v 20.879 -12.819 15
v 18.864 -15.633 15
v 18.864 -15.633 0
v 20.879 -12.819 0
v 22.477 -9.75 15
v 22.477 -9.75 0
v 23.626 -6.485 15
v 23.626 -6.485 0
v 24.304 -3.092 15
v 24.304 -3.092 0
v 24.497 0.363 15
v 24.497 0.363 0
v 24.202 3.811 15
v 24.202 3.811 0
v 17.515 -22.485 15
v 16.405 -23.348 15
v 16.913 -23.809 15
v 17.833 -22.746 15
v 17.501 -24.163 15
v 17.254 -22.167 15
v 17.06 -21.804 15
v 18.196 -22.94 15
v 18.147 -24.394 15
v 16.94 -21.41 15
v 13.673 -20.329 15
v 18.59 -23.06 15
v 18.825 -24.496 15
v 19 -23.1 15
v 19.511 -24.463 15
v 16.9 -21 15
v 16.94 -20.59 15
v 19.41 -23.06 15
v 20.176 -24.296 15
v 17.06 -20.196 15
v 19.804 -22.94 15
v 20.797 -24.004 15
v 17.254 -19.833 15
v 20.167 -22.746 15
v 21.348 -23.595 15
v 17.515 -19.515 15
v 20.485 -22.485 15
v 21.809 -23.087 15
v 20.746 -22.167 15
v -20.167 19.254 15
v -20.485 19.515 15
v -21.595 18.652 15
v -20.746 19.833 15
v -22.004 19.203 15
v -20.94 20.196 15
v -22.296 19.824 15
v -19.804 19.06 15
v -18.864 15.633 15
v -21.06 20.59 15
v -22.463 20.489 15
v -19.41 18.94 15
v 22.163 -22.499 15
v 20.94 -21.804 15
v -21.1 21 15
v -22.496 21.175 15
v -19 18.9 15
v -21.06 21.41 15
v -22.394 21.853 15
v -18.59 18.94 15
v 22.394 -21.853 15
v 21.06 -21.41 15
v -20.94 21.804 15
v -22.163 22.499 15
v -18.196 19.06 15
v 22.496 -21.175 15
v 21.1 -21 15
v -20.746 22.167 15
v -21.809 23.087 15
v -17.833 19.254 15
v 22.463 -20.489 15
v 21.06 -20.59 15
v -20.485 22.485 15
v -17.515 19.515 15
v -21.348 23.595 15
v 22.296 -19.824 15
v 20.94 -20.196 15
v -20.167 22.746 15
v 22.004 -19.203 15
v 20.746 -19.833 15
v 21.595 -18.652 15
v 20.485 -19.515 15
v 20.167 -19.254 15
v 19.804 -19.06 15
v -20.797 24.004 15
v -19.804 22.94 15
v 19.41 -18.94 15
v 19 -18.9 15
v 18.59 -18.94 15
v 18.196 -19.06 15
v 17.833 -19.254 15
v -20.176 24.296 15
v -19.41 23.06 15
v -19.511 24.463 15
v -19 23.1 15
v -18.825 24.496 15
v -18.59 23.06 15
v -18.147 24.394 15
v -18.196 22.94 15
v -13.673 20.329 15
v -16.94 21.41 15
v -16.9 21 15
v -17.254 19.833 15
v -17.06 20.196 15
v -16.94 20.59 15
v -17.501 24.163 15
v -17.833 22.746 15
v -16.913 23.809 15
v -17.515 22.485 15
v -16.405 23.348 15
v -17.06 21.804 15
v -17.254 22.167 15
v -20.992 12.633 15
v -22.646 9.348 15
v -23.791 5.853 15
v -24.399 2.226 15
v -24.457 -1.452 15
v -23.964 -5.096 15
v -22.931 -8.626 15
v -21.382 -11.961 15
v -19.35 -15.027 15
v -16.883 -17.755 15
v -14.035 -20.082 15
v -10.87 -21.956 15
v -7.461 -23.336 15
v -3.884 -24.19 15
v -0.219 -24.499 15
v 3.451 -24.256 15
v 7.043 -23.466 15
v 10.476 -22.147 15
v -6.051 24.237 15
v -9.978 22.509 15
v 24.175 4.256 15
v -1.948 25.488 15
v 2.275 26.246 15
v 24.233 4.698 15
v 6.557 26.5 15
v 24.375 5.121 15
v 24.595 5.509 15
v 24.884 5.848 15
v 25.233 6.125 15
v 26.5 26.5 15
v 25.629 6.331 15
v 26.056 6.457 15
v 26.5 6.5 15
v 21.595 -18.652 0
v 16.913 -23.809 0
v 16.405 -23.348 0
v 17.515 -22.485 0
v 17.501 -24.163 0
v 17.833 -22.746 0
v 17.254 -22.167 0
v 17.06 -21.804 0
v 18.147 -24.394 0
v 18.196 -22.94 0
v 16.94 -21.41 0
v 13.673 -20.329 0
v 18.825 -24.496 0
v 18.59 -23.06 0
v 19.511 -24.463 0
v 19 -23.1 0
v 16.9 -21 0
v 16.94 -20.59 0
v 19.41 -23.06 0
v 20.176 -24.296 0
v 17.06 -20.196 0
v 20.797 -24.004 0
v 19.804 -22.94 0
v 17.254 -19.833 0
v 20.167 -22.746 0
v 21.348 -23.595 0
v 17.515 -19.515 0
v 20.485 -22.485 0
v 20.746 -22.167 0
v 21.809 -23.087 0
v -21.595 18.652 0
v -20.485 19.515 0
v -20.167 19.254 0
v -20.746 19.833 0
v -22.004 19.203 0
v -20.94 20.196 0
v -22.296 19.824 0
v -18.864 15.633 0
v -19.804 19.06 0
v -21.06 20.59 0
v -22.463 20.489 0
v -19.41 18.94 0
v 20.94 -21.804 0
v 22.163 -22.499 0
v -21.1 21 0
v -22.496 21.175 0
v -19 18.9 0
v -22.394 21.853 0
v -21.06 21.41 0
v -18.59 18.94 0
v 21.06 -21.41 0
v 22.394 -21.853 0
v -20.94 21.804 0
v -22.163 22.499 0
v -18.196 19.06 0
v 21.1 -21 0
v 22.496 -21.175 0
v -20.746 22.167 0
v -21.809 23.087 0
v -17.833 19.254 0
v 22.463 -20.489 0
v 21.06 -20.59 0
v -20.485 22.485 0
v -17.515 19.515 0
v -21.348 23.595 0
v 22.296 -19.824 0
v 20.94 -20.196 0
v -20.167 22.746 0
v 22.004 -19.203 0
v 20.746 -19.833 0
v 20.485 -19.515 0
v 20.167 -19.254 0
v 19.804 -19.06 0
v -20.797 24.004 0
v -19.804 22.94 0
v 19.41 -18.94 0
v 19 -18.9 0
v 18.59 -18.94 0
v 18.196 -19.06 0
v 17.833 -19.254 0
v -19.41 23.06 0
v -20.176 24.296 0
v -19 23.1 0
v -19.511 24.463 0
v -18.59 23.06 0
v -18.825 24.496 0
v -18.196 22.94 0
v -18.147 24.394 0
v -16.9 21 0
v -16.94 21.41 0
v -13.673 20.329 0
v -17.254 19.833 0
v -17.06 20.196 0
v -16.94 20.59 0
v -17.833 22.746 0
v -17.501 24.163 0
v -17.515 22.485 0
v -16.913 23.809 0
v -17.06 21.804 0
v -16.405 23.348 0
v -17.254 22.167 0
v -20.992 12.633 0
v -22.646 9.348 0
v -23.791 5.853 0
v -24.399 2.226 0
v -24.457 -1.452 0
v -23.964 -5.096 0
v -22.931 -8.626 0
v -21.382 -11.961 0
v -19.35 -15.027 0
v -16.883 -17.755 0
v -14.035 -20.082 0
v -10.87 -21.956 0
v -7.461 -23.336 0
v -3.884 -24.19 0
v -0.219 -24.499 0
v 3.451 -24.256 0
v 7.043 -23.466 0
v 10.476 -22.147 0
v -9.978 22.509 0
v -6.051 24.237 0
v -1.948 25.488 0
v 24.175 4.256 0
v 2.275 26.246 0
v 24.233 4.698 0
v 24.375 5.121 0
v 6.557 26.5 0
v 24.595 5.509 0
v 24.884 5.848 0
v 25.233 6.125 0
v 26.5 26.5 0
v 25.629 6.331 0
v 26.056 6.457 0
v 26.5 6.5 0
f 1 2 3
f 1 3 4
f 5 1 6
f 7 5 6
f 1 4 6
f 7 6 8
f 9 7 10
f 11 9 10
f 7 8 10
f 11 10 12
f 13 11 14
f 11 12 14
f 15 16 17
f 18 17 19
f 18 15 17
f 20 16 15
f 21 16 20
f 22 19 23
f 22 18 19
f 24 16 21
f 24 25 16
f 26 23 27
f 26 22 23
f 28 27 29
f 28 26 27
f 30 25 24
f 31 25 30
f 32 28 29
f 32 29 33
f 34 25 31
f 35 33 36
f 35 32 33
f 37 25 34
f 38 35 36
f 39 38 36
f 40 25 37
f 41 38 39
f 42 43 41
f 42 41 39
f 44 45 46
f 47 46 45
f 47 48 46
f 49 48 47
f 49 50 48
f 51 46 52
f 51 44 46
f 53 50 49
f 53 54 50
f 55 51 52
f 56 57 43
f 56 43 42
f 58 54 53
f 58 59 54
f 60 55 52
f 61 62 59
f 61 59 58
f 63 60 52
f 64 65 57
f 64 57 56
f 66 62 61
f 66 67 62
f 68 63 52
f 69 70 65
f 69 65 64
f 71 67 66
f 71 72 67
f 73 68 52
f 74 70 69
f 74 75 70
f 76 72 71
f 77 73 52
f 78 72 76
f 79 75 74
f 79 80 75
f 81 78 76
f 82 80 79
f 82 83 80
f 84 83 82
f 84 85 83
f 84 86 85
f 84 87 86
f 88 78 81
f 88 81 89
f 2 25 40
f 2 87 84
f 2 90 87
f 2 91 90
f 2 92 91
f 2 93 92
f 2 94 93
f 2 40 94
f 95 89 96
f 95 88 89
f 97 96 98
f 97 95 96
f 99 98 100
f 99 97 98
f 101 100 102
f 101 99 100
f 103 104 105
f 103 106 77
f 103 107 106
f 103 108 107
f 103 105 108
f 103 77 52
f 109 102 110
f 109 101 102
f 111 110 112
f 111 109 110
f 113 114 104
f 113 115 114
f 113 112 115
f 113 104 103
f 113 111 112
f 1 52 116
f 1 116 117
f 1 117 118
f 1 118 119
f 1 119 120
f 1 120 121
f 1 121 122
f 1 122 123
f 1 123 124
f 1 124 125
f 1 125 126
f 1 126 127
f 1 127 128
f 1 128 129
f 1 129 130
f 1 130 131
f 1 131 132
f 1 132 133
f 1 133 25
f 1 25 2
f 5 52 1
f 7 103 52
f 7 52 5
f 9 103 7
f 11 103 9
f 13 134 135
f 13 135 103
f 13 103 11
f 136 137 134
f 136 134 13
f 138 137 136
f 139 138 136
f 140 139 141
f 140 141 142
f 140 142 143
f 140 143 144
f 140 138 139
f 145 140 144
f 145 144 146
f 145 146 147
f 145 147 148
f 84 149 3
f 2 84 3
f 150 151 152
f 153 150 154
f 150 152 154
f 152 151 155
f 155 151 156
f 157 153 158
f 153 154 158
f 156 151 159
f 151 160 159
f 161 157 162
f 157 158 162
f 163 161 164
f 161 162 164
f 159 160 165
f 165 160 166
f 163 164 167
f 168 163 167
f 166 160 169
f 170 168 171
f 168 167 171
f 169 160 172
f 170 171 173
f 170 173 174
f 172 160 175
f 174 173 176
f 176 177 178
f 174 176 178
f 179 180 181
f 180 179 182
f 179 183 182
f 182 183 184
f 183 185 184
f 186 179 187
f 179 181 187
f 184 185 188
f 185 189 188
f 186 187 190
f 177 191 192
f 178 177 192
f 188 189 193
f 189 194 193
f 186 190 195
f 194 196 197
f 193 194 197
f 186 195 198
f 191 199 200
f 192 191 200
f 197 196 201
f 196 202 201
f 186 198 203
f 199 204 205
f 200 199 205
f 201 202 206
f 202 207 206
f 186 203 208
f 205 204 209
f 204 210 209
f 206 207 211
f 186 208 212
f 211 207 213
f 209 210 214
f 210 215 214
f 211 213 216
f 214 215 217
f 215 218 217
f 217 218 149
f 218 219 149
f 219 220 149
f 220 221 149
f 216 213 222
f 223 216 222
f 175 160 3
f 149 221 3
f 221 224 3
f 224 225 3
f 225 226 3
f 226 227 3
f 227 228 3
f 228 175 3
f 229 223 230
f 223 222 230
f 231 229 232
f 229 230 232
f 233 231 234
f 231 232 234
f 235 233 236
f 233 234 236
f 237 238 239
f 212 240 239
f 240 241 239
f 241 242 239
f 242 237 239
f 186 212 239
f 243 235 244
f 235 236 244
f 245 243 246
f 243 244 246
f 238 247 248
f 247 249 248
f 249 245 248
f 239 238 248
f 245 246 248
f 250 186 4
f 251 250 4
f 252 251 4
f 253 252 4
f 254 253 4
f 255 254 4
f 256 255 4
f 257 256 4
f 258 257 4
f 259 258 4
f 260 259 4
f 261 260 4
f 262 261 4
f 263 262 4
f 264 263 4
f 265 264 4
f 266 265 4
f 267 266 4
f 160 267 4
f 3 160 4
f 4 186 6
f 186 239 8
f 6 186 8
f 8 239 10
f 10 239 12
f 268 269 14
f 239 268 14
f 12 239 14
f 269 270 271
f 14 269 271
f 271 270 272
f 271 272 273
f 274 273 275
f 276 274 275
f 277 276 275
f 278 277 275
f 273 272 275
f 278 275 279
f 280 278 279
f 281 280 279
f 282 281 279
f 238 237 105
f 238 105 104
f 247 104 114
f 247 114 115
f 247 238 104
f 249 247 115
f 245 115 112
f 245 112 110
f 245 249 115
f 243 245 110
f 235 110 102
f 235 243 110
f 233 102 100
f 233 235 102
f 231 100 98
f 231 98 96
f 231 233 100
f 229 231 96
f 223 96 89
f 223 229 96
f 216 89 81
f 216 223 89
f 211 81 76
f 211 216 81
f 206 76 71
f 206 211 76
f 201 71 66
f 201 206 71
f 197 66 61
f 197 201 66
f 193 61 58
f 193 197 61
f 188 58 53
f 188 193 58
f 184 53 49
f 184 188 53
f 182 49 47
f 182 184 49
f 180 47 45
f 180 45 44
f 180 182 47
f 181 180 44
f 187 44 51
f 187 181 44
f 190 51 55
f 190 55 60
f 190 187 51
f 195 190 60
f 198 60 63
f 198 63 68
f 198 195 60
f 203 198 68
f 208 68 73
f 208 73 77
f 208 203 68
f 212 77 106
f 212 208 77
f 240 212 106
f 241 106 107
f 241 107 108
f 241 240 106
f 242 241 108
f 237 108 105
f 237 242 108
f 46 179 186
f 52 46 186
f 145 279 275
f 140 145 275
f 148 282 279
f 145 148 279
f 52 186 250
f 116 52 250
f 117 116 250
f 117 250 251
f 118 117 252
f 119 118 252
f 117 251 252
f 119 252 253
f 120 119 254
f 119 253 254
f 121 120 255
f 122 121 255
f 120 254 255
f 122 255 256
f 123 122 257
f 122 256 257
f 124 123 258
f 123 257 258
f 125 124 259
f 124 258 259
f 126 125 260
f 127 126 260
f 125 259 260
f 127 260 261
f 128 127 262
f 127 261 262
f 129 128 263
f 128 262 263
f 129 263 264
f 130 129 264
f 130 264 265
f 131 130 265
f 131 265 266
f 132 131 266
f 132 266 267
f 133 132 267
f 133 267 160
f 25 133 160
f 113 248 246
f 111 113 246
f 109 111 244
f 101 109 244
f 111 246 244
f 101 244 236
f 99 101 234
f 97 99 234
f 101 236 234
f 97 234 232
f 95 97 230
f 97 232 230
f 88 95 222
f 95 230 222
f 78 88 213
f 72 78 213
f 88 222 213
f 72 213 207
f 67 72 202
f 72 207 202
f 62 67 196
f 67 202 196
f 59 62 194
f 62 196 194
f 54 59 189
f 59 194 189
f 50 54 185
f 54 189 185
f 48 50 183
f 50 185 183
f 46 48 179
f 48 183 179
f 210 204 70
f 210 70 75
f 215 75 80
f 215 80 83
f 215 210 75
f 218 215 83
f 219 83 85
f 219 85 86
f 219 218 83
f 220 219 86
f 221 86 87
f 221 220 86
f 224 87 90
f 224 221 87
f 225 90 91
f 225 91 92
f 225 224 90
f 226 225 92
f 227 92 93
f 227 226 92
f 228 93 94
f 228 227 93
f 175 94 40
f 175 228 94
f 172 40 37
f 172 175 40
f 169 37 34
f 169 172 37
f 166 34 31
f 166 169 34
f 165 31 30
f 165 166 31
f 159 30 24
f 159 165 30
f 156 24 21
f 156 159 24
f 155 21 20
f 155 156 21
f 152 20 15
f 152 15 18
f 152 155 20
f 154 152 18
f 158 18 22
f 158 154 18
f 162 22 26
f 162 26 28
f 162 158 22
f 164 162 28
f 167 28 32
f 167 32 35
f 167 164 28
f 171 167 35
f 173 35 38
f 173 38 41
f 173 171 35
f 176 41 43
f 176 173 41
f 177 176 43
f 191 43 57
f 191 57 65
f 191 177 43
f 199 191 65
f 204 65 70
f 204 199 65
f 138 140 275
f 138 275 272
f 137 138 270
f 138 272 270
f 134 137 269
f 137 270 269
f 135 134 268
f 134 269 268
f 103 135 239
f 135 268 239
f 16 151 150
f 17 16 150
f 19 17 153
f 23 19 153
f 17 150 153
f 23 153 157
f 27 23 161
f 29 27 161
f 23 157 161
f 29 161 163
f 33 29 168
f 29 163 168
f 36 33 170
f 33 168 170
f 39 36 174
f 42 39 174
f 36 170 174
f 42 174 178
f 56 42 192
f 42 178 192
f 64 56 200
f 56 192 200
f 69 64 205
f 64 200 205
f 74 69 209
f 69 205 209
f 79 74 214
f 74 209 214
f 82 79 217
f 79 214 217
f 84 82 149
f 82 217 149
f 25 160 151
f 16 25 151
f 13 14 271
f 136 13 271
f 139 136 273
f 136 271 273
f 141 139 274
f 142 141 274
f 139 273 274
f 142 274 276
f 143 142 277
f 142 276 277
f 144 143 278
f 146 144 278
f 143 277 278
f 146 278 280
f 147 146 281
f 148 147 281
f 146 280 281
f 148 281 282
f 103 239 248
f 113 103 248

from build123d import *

# Parameters (mm, degrees)
SKETCH1_R           = 2.1
BOSS_EXTRUDE1_DEPTH = 15


with BuildPart() as part:
    # Sketch1 → Boss-Extrude1 (new body)
    with BuildSketch(Plane.XY):
        with BuildLine():
            Line((-21.595375227, 18.651803366), (-18.864158731, 15.633090397))
            ThreePointArc((-18.864158731, 15.633090397), (-18.167626589, -16.437376437), (13.673408277, -20.329483665))
            Line((13.673408277, -20.329483665), (16.404624773, -23.348196634))
            ThreePointArc((16.404624773, -23.348196634), (21.348196634, -23.595375227), (21.595375227, -18.651803366))
            Line((21.595375227, -18.651803366), (18.864158731, -15.633090397))
            ThreePointArc((18.864158731, -15.633090397), (23.626039946, -6.485386377), (24.201713513, 3.811438449))
            ThreePointArc((24.201713513, 3.811438449), (24.731491872, 5.685176303), (26.5, 6.5))
            Line((26.5, 6.5), (26.5, 26.5))
            Line((26.5, 26.5), (6.557177663, 26.5))
            ThreePointArc((6.557177663, 26.5), (-4.018169605, 24.923070714), (-13.673408277, 20.329483665))
            Line((-13.673408277, 20.329483665), (-16.404624773, 23.348196634))
            ThreePointArc((-16.404624773, 23.348196634), (-21.348196634, 23.595375227), (-21.595375227, 18.651803366))
        make_face()
        with Locations((-19, 21)):
            Circle(SKETCH1_R, mode=Mode.SUBTRACT)
        with Locations((19, -21)):
            Circle(SKETCH1_R, mode=Mode.SUBTRACT)
    extrude(amount=BOSS_EXTRUDE1_DEPTH)


solid = part.part
